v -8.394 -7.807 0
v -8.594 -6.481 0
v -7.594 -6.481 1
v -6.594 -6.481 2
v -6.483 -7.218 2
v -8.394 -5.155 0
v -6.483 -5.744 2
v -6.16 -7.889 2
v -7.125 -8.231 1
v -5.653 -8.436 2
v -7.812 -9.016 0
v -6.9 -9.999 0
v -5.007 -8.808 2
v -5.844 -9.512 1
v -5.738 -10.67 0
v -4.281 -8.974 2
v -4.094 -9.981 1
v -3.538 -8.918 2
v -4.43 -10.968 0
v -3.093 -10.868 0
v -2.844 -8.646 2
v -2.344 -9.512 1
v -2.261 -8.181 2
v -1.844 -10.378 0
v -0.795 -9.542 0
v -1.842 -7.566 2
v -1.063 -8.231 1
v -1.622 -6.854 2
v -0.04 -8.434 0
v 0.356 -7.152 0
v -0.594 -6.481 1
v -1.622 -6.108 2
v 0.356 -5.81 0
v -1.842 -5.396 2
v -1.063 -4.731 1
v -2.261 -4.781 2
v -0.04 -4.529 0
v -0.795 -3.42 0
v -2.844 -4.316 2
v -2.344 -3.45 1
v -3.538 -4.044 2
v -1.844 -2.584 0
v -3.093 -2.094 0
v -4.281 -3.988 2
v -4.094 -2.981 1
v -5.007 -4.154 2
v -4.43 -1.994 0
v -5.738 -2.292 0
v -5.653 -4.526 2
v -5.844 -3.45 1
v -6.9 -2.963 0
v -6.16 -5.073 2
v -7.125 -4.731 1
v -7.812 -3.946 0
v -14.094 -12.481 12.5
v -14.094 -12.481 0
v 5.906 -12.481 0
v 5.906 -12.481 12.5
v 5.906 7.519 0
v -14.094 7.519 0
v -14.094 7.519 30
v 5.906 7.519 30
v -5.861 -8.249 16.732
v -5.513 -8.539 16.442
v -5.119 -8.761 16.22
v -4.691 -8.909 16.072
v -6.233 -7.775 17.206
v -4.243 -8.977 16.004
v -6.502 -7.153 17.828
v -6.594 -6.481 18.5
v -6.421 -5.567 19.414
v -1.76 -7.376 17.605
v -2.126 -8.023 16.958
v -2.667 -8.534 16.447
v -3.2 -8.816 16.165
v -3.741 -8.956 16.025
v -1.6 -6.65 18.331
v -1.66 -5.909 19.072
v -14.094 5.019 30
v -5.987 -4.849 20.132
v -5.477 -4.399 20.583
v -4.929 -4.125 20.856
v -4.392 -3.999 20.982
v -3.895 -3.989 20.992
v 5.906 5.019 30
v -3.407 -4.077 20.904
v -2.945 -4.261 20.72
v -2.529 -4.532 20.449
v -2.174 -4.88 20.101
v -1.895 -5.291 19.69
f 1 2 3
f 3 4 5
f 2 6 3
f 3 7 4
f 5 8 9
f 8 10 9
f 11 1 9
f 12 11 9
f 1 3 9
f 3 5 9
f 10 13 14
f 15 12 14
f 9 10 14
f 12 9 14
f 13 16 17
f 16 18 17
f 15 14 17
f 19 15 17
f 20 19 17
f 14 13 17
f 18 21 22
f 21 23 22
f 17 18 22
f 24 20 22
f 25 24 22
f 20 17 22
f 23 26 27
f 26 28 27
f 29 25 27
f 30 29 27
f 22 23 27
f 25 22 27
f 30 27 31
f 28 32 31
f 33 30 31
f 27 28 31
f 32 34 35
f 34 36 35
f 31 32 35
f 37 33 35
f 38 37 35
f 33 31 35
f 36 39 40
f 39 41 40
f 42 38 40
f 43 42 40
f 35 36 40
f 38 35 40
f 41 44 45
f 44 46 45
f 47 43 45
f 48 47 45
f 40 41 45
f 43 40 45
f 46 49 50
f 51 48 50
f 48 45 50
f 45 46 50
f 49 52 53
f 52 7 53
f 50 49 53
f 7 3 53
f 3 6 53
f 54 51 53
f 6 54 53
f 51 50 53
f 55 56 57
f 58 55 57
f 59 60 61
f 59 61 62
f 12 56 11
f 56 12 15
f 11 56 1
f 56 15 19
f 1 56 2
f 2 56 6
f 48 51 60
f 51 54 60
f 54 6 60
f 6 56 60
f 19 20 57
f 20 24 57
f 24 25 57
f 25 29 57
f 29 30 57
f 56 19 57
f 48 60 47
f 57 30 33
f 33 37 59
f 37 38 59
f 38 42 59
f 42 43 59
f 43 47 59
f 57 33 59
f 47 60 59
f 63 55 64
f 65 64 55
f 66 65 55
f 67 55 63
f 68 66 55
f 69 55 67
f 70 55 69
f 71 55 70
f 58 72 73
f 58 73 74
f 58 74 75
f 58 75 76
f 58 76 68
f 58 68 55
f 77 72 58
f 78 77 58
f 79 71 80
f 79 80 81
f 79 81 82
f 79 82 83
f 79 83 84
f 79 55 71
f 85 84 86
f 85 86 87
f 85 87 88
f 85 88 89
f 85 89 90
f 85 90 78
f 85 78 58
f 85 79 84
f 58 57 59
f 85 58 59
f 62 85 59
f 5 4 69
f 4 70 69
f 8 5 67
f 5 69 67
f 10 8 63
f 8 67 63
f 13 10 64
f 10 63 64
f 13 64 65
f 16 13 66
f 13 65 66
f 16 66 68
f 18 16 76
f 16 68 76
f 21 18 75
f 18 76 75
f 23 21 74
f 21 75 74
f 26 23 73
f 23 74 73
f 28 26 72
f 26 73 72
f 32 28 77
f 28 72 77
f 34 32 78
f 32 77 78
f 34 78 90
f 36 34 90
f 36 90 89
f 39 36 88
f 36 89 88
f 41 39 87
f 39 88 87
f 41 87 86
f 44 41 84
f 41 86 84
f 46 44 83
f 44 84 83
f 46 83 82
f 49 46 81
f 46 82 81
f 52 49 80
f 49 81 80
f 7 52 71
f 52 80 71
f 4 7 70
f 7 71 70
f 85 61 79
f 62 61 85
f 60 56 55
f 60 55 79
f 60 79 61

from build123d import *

# Parameters (mm, degrees)
F0_W           = 20
F0_H           = 20
F1_DEPTH       = 30
F2_SIZE        = 17.5
F4_D           = 5
F4_CSINK_D     = 9
F4_CSINK_ANGLE = 90


with BuildPart() as f1:
    # F0 (on Top) → F1 (new body)
    with BuildSketch(Plane.XY):
        with Locations((-4.093967, -2.481039)):
            Rectangle(F0_W, F0_H)
    extrude(amount=F1_DEPTH)

    # F2
    f2_edges = [f1.edges().sort_by_distance(p)[0] for p in [
        (-4.093967, -12.481039, 30),
    ]]
    chamfer(f2_edges, length=F2_SIZE)

    # F4 (through all)
    with Locations(Plane(origin=(0, 0, 0), x_dir=(1, 0, 0), z_dir=(0, 0, -1))):
        with Locations((-4.093967, 6.481039)):
            CounterSinkHole(F4_D / 2, F4_CSINK_D / 2, counter_sink_angle=F4_CSINK_ANGLE)


solid = f1.part
